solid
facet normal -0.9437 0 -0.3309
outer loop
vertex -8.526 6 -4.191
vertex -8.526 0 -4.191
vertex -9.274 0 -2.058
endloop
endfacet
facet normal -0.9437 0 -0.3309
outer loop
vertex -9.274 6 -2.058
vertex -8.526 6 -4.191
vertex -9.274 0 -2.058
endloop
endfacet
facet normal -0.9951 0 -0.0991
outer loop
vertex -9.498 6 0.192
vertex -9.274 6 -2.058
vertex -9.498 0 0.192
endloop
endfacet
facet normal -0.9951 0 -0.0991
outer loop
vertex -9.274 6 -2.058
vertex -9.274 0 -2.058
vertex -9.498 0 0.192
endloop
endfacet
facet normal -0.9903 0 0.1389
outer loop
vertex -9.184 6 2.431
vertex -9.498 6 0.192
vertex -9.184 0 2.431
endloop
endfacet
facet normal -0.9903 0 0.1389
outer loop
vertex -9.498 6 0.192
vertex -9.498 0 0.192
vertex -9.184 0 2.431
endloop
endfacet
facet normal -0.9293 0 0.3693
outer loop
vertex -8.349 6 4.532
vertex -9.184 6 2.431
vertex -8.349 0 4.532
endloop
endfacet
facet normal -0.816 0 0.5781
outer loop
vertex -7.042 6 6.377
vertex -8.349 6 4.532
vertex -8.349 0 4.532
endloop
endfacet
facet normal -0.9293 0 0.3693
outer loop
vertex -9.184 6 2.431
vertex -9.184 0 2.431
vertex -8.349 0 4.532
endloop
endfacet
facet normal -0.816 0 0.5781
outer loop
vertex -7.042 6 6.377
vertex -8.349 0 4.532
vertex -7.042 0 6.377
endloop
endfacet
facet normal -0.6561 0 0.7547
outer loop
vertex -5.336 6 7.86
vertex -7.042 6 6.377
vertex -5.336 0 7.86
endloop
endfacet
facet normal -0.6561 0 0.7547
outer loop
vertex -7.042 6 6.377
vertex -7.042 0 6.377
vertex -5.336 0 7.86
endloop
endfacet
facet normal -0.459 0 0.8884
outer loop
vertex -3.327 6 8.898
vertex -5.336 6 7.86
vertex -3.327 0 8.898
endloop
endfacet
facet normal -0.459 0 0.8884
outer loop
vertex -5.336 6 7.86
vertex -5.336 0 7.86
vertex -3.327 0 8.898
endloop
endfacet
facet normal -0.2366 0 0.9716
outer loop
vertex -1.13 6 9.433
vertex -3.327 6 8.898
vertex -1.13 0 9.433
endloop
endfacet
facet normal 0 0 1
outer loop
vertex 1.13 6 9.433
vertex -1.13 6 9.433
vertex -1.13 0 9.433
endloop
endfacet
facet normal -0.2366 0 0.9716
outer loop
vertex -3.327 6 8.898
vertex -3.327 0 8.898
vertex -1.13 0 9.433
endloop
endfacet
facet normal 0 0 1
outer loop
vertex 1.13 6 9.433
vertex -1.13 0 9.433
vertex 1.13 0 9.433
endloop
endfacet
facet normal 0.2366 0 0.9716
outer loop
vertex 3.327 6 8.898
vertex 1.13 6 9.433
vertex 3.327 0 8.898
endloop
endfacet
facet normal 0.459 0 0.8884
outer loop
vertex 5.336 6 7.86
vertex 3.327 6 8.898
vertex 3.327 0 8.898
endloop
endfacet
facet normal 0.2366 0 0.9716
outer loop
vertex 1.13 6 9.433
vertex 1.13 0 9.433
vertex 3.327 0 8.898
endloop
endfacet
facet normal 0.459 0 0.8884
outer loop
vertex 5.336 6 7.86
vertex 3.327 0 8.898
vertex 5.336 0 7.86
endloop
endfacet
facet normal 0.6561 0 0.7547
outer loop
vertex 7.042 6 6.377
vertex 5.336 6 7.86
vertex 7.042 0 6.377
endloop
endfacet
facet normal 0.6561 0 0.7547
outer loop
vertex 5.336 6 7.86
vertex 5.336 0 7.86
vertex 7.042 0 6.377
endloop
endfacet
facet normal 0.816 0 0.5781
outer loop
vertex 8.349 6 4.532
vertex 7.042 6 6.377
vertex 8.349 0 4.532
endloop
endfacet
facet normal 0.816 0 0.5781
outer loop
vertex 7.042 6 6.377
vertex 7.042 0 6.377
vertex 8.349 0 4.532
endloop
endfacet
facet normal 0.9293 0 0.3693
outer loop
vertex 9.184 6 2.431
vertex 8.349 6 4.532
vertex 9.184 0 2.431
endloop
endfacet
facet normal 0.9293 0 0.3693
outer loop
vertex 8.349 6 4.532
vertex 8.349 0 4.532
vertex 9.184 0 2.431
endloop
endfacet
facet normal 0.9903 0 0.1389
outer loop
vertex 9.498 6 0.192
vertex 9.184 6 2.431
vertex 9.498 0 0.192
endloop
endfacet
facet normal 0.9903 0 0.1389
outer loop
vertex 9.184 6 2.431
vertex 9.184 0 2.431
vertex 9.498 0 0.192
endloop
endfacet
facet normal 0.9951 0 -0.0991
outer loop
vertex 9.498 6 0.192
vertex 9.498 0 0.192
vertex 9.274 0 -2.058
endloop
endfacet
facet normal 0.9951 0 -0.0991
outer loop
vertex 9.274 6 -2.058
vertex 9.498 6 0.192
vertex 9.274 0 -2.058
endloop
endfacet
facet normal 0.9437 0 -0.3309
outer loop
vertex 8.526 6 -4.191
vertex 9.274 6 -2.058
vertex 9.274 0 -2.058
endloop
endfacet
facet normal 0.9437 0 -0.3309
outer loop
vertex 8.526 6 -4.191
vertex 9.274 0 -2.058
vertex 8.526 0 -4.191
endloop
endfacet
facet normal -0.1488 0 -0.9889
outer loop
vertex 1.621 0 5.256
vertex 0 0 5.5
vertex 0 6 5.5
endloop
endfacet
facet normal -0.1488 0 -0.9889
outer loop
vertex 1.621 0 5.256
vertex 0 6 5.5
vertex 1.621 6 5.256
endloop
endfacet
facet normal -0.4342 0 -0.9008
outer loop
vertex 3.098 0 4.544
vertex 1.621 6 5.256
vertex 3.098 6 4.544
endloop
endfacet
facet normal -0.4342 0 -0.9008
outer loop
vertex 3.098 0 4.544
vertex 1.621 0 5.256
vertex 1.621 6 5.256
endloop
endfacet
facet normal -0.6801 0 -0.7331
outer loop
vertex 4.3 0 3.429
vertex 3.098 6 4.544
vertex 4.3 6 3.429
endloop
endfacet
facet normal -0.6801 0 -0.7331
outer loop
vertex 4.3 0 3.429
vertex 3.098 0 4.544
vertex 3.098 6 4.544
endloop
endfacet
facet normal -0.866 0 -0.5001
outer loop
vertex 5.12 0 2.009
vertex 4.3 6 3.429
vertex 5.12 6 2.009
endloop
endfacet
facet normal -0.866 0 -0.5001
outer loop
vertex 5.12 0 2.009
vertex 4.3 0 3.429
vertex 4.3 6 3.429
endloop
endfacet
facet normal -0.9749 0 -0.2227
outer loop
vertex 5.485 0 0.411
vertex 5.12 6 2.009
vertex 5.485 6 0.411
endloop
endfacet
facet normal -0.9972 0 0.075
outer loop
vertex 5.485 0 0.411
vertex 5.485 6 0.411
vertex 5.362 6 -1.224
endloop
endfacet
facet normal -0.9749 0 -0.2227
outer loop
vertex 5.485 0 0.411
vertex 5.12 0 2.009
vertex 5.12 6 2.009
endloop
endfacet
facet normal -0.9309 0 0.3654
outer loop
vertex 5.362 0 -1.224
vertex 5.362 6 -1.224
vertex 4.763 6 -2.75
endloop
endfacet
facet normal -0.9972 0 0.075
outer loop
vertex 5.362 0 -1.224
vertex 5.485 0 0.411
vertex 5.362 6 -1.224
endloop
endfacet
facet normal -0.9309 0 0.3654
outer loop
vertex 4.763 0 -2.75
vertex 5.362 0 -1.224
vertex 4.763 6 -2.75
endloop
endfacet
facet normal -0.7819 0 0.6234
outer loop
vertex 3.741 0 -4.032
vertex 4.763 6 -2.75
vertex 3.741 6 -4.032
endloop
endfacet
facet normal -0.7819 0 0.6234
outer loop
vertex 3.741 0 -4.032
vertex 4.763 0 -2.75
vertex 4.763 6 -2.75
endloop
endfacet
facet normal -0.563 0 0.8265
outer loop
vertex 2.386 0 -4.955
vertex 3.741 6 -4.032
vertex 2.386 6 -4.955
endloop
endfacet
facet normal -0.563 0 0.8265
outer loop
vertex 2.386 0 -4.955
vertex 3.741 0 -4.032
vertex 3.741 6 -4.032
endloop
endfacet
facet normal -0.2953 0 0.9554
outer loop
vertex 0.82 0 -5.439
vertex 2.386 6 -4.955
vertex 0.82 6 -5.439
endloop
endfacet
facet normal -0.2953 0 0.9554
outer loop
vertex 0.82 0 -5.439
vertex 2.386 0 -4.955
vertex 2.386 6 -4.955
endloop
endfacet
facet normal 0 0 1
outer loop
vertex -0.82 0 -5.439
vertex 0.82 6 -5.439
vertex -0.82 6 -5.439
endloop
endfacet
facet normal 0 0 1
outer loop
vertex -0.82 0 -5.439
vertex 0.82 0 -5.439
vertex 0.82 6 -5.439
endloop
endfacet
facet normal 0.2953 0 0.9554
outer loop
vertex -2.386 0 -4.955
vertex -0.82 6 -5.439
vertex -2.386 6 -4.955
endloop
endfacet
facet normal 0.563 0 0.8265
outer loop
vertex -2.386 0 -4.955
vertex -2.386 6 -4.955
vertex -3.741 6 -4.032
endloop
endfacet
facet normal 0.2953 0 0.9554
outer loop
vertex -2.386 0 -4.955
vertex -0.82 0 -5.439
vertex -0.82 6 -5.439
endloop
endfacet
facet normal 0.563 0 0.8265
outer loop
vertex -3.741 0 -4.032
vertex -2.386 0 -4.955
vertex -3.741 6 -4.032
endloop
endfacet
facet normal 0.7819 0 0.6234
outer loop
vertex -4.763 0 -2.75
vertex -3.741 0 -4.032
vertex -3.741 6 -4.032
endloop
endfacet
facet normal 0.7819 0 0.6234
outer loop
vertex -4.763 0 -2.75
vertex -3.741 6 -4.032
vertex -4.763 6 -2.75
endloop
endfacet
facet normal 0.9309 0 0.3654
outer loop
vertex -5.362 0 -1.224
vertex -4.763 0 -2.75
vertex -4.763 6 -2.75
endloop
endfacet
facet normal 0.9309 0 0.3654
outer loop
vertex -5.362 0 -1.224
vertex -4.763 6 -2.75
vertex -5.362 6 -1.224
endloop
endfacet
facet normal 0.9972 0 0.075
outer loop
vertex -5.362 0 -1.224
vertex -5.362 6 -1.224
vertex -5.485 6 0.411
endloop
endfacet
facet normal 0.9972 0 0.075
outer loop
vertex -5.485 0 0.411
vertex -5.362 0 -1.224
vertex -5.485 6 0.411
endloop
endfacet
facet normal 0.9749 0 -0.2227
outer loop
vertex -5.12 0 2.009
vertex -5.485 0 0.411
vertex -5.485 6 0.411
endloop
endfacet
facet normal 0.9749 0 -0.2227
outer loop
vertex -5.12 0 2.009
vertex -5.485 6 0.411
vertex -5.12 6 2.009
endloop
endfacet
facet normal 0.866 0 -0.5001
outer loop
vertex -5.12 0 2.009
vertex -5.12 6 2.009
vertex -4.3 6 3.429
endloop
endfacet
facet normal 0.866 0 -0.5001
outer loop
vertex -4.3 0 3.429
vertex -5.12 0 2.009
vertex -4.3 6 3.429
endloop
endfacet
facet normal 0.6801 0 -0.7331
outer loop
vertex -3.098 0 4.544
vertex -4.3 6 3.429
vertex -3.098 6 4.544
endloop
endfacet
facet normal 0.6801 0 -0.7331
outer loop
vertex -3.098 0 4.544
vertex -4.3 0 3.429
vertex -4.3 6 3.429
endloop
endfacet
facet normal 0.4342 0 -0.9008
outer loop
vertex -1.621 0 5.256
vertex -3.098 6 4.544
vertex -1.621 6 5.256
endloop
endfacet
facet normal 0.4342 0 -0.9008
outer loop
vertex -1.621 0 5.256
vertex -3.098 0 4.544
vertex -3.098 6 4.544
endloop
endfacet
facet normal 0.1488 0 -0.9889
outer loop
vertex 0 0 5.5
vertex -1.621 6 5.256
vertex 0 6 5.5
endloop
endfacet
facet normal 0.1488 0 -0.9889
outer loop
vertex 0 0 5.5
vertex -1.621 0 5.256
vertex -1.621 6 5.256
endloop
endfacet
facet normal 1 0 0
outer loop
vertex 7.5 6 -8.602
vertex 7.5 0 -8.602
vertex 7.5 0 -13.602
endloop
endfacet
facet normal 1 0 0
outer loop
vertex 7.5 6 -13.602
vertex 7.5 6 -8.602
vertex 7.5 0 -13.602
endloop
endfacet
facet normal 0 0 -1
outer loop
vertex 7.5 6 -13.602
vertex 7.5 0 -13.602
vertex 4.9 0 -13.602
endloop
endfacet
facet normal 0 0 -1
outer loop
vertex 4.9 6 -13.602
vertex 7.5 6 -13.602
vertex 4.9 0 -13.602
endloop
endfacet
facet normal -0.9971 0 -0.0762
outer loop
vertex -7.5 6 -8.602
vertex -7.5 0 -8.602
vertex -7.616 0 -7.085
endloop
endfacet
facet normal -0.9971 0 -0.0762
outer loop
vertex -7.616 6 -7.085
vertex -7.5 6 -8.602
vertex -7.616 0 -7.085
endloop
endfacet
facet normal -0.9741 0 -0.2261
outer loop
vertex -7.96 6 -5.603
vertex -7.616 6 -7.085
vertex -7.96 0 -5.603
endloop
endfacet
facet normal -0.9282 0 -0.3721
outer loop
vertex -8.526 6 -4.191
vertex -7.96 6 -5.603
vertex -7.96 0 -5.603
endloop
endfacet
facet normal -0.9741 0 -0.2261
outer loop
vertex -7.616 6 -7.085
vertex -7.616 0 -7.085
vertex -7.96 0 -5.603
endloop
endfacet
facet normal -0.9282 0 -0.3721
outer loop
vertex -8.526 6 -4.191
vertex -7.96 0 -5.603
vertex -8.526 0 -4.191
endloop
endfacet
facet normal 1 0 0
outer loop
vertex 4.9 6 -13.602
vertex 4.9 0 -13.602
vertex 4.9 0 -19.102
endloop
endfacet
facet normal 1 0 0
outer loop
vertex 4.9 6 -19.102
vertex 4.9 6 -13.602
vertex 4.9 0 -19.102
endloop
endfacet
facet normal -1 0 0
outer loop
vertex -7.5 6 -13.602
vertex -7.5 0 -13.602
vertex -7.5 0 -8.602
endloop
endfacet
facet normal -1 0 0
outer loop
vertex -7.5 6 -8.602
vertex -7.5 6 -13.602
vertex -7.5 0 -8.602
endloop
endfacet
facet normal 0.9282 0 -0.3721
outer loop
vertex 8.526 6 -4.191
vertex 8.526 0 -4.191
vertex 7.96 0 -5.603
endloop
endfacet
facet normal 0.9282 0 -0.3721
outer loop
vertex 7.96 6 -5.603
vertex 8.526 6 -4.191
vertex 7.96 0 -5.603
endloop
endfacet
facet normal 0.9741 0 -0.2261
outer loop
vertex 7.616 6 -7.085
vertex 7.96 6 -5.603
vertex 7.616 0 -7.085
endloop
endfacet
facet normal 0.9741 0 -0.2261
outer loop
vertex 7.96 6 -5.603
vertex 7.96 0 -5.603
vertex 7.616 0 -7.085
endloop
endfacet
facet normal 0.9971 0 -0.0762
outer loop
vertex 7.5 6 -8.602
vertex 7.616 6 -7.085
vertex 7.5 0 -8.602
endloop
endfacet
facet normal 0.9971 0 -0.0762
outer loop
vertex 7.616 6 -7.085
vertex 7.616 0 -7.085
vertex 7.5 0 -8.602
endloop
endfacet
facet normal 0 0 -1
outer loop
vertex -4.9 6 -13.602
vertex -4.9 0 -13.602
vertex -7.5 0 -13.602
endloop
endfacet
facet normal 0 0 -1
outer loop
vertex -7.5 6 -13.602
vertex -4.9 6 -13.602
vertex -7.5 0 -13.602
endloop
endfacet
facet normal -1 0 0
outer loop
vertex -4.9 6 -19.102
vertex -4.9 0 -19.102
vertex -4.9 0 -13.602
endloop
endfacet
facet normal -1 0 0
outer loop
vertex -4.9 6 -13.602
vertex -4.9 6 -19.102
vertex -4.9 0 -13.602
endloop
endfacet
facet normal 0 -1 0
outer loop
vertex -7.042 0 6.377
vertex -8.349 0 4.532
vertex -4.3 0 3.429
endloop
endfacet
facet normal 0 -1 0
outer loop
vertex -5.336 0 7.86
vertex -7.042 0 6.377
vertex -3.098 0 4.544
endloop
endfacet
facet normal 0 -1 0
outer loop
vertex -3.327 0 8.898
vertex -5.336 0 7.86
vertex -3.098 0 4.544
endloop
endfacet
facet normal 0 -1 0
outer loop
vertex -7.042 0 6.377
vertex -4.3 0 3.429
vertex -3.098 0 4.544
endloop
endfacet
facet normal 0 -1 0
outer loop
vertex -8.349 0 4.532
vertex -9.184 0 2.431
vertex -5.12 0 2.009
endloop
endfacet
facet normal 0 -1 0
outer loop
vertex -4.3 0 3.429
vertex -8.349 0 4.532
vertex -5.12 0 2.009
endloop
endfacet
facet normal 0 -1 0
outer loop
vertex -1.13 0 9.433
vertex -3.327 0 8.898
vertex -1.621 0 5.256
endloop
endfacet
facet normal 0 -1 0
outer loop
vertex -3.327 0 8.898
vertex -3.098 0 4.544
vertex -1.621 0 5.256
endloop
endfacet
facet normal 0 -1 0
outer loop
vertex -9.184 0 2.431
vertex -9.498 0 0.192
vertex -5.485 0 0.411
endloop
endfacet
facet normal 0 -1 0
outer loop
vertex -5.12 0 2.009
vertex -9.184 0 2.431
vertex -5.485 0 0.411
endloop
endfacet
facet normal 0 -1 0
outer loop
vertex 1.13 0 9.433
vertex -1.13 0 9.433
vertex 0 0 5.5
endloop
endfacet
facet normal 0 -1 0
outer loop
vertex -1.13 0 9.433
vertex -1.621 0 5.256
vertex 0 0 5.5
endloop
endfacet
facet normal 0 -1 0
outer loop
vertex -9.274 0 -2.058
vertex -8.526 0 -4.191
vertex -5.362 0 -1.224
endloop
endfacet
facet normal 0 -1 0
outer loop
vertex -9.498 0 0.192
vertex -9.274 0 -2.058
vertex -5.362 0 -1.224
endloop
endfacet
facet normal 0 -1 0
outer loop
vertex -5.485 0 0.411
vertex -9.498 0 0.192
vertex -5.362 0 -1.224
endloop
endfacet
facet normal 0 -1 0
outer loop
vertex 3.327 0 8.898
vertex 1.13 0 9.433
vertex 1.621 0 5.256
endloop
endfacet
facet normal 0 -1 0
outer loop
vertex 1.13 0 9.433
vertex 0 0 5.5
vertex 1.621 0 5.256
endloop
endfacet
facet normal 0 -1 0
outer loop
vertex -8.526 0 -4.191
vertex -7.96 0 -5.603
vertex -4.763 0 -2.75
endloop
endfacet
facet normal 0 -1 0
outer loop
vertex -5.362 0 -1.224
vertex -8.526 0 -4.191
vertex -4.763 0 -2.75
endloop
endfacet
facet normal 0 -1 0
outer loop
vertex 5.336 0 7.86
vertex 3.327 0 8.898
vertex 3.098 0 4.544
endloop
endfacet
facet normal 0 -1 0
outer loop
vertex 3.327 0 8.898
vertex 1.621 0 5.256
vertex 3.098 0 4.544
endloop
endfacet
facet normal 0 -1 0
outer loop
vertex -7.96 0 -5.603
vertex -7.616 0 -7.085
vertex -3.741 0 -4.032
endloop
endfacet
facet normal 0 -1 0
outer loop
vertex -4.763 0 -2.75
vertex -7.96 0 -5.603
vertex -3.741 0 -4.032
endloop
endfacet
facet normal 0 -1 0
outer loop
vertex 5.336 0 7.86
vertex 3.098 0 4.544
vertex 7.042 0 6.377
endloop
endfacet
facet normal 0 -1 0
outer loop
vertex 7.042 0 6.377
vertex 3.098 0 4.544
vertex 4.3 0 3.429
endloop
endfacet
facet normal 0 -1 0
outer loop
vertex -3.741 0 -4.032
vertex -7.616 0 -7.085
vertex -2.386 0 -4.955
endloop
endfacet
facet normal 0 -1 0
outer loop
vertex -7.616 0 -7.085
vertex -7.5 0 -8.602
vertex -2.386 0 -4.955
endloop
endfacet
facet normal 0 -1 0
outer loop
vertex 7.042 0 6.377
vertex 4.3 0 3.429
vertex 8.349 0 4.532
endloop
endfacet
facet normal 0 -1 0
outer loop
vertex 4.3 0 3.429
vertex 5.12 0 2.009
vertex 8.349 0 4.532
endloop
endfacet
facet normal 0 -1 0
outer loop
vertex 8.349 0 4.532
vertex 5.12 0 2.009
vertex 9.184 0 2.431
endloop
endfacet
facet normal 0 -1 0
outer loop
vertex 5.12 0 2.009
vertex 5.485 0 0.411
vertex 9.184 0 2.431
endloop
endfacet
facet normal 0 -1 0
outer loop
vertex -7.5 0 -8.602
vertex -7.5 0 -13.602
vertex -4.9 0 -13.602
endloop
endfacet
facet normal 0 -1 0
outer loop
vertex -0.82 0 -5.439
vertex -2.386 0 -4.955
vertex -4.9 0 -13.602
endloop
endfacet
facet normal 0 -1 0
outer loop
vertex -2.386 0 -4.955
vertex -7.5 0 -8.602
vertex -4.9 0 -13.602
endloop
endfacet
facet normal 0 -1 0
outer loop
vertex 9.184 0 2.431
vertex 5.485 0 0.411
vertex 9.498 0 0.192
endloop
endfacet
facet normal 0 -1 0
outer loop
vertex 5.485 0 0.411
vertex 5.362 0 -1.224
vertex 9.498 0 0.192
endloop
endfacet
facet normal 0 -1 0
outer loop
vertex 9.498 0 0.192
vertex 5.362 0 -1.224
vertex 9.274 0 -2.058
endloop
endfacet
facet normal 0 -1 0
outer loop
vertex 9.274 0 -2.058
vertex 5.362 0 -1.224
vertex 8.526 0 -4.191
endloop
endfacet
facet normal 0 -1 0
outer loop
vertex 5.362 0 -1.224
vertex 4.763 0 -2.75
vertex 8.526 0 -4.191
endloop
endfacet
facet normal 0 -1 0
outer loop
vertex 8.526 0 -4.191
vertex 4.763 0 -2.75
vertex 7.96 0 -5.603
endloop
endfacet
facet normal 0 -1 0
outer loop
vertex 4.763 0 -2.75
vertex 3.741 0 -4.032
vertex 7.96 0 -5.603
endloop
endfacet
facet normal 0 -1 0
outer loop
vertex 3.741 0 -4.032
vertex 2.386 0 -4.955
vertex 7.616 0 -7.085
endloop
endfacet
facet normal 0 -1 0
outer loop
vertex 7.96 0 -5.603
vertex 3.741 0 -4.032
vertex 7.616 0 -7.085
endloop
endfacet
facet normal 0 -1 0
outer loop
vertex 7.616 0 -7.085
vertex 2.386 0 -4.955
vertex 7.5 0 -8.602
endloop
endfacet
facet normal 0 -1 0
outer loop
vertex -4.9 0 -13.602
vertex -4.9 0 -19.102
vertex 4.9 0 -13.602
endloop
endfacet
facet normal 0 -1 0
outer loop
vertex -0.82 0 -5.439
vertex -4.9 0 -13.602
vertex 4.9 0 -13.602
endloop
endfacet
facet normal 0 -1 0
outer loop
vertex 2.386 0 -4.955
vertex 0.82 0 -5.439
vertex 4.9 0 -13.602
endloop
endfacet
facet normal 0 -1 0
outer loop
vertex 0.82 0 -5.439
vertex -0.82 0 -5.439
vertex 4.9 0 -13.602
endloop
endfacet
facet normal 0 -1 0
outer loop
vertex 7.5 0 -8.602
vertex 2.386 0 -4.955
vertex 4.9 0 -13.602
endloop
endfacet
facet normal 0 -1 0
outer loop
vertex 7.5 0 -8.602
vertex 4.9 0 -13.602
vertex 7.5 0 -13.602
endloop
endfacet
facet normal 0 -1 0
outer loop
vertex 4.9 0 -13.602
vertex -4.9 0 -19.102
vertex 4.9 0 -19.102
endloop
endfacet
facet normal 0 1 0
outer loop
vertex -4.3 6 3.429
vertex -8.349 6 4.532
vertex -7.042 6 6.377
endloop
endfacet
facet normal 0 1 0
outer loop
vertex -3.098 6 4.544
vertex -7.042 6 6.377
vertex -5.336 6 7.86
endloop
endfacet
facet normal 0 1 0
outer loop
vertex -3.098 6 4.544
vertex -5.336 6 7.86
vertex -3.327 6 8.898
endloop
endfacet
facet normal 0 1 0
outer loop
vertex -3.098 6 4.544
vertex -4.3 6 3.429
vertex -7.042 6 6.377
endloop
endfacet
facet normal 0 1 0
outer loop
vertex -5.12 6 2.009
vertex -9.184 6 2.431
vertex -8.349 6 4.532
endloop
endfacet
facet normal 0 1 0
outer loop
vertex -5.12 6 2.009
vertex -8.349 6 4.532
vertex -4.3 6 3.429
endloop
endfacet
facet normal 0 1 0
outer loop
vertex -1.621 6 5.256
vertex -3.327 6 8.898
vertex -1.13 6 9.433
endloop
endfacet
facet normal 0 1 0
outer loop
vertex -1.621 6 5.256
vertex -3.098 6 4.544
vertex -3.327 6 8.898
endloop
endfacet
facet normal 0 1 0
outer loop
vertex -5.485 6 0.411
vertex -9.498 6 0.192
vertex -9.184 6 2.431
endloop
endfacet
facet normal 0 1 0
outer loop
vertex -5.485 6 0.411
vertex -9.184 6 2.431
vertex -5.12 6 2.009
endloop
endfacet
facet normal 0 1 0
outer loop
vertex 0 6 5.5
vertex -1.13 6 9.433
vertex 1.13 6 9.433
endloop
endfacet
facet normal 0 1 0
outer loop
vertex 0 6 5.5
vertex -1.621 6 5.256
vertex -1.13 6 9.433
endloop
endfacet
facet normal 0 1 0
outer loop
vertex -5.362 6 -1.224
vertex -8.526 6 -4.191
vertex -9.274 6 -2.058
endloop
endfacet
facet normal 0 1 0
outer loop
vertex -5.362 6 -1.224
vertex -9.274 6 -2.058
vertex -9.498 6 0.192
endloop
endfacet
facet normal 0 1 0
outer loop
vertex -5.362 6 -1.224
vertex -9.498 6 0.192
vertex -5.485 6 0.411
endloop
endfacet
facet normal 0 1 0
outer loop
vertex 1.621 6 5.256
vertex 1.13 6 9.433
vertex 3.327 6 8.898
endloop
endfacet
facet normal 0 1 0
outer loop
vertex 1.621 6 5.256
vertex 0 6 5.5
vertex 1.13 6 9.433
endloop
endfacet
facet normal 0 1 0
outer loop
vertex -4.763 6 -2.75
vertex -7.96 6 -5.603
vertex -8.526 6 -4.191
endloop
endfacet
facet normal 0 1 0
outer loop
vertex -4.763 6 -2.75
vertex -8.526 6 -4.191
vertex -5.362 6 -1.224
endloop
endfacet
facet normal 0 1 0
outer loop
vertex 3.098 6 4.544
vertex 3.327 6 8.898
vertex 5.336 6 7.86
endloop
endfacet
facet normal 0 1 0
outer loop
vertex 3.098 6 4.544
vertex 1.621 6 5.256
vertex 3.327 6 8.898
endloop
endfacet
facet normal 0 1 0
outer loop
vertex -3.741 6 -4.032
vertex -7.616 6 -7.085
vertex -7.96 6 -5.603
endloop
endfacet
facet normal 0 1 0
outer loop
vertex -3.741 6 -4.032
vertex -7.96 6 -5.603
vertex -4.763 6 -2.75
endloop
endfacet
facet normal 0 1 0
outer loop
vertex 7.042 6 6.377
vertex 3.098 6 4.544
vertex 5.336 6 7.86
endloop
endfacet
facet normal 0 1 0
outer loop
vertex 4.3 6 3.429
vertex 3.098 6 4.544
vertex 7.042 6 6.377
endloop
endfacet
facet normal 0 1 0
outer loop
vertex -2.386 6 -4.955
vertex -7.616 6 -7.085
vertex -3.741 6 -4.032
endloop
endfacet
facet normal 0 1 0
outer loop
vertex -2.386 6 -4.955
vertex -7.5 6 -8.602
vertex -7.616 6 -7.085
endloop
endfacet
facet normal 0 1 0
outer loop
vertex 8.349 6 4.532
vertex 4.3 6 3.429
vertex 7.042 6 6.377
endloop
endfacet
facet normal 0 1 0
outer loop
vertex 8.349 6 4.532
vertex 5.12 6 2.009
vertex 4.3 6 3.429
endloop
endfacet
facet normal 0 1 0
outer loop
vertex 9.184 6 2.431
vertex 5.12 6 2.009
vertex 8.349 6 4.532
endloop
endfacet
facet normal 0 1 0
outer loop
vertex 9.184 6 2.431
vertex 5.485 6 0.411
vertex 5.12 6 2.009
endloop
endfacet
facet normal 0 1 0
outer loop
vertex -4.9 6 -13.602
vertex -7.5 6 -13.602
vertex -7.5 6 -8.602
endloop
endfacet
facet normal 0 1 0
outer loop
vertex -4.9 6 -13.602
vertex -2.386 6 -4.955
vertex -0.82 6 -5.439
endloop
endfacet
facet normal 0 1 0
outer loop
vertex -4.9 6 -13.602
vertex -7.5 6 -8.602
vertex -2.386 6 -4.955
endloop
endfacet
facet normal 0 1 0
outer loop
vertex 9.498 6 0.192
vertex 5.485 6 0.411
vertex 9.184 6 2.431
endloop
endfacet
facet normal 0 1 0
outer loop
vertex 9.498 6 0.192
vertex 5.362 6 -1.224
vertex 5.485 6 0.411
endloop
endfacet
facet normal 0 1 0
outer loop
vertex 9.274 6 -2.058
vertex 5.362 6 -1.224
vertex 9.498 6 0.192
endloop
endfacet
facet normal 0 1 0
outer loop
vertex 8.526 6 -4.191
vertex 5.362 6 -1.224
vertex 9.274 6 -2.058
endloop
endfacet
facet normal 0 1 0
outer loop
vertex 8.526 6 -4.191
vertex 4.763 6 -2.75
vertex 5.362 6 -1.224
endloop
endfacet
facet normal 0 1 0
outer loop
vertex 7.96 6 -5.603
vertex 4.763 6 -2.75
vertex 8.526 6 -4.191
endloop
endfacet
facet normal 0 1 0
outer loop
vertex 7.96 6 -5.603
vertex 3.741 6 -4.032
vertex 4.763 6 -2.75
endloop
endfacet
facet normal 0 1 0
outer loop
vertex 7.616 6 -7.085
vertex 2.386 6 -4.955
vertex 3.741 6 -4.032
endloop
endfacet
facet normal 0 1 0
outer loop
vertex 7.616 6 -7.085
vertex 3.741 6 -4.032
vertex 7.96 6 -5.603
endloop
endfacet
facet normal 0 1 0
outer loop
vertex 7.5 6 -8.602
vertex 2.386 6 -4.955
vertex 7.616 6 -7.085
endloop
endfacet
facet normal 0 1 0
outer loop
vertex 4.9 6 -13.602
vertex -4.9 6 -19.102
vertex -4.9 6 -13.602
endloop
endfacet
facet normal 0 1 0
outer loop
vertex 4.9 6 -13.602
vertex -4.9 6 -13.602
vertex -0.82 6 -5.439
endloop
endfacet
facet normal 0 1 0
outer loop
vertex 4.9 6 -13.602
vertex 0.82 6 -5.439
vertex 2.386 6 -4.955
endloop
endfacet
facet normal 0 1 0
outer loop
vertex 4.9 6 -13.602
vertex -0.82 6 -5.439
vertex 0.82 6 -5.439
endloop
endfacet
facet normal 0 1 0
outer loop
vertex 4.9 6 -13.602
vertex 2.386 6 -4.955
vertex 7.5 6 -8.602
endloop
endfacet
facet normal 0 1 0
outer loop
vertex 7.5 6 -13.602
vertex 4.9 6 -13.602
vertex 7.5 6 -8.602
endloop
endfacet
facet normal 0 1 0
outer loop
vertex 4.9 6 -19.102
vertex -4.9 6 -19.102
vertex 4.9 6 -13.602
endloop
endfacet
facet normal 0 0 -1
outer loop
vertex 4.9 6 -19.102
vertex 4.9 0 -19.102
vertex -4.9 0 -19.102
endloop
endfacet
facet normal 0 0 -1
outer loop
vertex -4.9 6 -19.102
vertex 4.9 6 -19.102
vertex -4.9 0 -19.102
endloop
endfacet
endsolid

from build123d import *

# Parameters (mm, degrees)
SKETCH1_R           = 5.5
BOSS_EXTRUDE1_DEPTH = 6


with BuildPart() as part:
    # Sketch1 → Boss-Extrude1 (new body)
    with BuildSketch(Plane(origin=(0, 0, 0), x_dir=(1, 0, 0), z_dir=(0, 1, 0))):
        with BuildLine():
            Line((7.5, 8.602325267), (7.5, 13.602325267))
            Line((7.5, 13.602325267), (4.9, 13.602325267))
            Line((4.9, 13.602325267), (4.9, 19.102325267))
            Line((4.9, 19.102325267), (-4.9, 19.102325267))
            Line((-4.9, 19.102325267), (-4.9, 13.602325267))
            Line((-4.9, 13.602325267), (-7.5, 13.602325267))
            Line((-7.5, 13.602325267), (-7.5, 8.602325267))
            ThreePointArc((-7.5, 8.602325267), (-7.75978466, 6.337771199), (-8.525641026, 4.190876412))
            ThreePointArc((-8.525641026, 4.190876412), (0, -9.5), (8.525641026, 4.190876412))
            ThreePointArc((8.525641026, 4.190876412), (7.75978466, 6.337771199), (7.5, 8.602325267))
        make_face()
        with Locations(Location((0, 0, 0), (0, 0, 270))):
            Circle(SKETCH1_R, mode=Mode.SUBTRACT)
    extrude(amount=BOSS_EXTRUDE1_DEPTH)


solid = part.part
